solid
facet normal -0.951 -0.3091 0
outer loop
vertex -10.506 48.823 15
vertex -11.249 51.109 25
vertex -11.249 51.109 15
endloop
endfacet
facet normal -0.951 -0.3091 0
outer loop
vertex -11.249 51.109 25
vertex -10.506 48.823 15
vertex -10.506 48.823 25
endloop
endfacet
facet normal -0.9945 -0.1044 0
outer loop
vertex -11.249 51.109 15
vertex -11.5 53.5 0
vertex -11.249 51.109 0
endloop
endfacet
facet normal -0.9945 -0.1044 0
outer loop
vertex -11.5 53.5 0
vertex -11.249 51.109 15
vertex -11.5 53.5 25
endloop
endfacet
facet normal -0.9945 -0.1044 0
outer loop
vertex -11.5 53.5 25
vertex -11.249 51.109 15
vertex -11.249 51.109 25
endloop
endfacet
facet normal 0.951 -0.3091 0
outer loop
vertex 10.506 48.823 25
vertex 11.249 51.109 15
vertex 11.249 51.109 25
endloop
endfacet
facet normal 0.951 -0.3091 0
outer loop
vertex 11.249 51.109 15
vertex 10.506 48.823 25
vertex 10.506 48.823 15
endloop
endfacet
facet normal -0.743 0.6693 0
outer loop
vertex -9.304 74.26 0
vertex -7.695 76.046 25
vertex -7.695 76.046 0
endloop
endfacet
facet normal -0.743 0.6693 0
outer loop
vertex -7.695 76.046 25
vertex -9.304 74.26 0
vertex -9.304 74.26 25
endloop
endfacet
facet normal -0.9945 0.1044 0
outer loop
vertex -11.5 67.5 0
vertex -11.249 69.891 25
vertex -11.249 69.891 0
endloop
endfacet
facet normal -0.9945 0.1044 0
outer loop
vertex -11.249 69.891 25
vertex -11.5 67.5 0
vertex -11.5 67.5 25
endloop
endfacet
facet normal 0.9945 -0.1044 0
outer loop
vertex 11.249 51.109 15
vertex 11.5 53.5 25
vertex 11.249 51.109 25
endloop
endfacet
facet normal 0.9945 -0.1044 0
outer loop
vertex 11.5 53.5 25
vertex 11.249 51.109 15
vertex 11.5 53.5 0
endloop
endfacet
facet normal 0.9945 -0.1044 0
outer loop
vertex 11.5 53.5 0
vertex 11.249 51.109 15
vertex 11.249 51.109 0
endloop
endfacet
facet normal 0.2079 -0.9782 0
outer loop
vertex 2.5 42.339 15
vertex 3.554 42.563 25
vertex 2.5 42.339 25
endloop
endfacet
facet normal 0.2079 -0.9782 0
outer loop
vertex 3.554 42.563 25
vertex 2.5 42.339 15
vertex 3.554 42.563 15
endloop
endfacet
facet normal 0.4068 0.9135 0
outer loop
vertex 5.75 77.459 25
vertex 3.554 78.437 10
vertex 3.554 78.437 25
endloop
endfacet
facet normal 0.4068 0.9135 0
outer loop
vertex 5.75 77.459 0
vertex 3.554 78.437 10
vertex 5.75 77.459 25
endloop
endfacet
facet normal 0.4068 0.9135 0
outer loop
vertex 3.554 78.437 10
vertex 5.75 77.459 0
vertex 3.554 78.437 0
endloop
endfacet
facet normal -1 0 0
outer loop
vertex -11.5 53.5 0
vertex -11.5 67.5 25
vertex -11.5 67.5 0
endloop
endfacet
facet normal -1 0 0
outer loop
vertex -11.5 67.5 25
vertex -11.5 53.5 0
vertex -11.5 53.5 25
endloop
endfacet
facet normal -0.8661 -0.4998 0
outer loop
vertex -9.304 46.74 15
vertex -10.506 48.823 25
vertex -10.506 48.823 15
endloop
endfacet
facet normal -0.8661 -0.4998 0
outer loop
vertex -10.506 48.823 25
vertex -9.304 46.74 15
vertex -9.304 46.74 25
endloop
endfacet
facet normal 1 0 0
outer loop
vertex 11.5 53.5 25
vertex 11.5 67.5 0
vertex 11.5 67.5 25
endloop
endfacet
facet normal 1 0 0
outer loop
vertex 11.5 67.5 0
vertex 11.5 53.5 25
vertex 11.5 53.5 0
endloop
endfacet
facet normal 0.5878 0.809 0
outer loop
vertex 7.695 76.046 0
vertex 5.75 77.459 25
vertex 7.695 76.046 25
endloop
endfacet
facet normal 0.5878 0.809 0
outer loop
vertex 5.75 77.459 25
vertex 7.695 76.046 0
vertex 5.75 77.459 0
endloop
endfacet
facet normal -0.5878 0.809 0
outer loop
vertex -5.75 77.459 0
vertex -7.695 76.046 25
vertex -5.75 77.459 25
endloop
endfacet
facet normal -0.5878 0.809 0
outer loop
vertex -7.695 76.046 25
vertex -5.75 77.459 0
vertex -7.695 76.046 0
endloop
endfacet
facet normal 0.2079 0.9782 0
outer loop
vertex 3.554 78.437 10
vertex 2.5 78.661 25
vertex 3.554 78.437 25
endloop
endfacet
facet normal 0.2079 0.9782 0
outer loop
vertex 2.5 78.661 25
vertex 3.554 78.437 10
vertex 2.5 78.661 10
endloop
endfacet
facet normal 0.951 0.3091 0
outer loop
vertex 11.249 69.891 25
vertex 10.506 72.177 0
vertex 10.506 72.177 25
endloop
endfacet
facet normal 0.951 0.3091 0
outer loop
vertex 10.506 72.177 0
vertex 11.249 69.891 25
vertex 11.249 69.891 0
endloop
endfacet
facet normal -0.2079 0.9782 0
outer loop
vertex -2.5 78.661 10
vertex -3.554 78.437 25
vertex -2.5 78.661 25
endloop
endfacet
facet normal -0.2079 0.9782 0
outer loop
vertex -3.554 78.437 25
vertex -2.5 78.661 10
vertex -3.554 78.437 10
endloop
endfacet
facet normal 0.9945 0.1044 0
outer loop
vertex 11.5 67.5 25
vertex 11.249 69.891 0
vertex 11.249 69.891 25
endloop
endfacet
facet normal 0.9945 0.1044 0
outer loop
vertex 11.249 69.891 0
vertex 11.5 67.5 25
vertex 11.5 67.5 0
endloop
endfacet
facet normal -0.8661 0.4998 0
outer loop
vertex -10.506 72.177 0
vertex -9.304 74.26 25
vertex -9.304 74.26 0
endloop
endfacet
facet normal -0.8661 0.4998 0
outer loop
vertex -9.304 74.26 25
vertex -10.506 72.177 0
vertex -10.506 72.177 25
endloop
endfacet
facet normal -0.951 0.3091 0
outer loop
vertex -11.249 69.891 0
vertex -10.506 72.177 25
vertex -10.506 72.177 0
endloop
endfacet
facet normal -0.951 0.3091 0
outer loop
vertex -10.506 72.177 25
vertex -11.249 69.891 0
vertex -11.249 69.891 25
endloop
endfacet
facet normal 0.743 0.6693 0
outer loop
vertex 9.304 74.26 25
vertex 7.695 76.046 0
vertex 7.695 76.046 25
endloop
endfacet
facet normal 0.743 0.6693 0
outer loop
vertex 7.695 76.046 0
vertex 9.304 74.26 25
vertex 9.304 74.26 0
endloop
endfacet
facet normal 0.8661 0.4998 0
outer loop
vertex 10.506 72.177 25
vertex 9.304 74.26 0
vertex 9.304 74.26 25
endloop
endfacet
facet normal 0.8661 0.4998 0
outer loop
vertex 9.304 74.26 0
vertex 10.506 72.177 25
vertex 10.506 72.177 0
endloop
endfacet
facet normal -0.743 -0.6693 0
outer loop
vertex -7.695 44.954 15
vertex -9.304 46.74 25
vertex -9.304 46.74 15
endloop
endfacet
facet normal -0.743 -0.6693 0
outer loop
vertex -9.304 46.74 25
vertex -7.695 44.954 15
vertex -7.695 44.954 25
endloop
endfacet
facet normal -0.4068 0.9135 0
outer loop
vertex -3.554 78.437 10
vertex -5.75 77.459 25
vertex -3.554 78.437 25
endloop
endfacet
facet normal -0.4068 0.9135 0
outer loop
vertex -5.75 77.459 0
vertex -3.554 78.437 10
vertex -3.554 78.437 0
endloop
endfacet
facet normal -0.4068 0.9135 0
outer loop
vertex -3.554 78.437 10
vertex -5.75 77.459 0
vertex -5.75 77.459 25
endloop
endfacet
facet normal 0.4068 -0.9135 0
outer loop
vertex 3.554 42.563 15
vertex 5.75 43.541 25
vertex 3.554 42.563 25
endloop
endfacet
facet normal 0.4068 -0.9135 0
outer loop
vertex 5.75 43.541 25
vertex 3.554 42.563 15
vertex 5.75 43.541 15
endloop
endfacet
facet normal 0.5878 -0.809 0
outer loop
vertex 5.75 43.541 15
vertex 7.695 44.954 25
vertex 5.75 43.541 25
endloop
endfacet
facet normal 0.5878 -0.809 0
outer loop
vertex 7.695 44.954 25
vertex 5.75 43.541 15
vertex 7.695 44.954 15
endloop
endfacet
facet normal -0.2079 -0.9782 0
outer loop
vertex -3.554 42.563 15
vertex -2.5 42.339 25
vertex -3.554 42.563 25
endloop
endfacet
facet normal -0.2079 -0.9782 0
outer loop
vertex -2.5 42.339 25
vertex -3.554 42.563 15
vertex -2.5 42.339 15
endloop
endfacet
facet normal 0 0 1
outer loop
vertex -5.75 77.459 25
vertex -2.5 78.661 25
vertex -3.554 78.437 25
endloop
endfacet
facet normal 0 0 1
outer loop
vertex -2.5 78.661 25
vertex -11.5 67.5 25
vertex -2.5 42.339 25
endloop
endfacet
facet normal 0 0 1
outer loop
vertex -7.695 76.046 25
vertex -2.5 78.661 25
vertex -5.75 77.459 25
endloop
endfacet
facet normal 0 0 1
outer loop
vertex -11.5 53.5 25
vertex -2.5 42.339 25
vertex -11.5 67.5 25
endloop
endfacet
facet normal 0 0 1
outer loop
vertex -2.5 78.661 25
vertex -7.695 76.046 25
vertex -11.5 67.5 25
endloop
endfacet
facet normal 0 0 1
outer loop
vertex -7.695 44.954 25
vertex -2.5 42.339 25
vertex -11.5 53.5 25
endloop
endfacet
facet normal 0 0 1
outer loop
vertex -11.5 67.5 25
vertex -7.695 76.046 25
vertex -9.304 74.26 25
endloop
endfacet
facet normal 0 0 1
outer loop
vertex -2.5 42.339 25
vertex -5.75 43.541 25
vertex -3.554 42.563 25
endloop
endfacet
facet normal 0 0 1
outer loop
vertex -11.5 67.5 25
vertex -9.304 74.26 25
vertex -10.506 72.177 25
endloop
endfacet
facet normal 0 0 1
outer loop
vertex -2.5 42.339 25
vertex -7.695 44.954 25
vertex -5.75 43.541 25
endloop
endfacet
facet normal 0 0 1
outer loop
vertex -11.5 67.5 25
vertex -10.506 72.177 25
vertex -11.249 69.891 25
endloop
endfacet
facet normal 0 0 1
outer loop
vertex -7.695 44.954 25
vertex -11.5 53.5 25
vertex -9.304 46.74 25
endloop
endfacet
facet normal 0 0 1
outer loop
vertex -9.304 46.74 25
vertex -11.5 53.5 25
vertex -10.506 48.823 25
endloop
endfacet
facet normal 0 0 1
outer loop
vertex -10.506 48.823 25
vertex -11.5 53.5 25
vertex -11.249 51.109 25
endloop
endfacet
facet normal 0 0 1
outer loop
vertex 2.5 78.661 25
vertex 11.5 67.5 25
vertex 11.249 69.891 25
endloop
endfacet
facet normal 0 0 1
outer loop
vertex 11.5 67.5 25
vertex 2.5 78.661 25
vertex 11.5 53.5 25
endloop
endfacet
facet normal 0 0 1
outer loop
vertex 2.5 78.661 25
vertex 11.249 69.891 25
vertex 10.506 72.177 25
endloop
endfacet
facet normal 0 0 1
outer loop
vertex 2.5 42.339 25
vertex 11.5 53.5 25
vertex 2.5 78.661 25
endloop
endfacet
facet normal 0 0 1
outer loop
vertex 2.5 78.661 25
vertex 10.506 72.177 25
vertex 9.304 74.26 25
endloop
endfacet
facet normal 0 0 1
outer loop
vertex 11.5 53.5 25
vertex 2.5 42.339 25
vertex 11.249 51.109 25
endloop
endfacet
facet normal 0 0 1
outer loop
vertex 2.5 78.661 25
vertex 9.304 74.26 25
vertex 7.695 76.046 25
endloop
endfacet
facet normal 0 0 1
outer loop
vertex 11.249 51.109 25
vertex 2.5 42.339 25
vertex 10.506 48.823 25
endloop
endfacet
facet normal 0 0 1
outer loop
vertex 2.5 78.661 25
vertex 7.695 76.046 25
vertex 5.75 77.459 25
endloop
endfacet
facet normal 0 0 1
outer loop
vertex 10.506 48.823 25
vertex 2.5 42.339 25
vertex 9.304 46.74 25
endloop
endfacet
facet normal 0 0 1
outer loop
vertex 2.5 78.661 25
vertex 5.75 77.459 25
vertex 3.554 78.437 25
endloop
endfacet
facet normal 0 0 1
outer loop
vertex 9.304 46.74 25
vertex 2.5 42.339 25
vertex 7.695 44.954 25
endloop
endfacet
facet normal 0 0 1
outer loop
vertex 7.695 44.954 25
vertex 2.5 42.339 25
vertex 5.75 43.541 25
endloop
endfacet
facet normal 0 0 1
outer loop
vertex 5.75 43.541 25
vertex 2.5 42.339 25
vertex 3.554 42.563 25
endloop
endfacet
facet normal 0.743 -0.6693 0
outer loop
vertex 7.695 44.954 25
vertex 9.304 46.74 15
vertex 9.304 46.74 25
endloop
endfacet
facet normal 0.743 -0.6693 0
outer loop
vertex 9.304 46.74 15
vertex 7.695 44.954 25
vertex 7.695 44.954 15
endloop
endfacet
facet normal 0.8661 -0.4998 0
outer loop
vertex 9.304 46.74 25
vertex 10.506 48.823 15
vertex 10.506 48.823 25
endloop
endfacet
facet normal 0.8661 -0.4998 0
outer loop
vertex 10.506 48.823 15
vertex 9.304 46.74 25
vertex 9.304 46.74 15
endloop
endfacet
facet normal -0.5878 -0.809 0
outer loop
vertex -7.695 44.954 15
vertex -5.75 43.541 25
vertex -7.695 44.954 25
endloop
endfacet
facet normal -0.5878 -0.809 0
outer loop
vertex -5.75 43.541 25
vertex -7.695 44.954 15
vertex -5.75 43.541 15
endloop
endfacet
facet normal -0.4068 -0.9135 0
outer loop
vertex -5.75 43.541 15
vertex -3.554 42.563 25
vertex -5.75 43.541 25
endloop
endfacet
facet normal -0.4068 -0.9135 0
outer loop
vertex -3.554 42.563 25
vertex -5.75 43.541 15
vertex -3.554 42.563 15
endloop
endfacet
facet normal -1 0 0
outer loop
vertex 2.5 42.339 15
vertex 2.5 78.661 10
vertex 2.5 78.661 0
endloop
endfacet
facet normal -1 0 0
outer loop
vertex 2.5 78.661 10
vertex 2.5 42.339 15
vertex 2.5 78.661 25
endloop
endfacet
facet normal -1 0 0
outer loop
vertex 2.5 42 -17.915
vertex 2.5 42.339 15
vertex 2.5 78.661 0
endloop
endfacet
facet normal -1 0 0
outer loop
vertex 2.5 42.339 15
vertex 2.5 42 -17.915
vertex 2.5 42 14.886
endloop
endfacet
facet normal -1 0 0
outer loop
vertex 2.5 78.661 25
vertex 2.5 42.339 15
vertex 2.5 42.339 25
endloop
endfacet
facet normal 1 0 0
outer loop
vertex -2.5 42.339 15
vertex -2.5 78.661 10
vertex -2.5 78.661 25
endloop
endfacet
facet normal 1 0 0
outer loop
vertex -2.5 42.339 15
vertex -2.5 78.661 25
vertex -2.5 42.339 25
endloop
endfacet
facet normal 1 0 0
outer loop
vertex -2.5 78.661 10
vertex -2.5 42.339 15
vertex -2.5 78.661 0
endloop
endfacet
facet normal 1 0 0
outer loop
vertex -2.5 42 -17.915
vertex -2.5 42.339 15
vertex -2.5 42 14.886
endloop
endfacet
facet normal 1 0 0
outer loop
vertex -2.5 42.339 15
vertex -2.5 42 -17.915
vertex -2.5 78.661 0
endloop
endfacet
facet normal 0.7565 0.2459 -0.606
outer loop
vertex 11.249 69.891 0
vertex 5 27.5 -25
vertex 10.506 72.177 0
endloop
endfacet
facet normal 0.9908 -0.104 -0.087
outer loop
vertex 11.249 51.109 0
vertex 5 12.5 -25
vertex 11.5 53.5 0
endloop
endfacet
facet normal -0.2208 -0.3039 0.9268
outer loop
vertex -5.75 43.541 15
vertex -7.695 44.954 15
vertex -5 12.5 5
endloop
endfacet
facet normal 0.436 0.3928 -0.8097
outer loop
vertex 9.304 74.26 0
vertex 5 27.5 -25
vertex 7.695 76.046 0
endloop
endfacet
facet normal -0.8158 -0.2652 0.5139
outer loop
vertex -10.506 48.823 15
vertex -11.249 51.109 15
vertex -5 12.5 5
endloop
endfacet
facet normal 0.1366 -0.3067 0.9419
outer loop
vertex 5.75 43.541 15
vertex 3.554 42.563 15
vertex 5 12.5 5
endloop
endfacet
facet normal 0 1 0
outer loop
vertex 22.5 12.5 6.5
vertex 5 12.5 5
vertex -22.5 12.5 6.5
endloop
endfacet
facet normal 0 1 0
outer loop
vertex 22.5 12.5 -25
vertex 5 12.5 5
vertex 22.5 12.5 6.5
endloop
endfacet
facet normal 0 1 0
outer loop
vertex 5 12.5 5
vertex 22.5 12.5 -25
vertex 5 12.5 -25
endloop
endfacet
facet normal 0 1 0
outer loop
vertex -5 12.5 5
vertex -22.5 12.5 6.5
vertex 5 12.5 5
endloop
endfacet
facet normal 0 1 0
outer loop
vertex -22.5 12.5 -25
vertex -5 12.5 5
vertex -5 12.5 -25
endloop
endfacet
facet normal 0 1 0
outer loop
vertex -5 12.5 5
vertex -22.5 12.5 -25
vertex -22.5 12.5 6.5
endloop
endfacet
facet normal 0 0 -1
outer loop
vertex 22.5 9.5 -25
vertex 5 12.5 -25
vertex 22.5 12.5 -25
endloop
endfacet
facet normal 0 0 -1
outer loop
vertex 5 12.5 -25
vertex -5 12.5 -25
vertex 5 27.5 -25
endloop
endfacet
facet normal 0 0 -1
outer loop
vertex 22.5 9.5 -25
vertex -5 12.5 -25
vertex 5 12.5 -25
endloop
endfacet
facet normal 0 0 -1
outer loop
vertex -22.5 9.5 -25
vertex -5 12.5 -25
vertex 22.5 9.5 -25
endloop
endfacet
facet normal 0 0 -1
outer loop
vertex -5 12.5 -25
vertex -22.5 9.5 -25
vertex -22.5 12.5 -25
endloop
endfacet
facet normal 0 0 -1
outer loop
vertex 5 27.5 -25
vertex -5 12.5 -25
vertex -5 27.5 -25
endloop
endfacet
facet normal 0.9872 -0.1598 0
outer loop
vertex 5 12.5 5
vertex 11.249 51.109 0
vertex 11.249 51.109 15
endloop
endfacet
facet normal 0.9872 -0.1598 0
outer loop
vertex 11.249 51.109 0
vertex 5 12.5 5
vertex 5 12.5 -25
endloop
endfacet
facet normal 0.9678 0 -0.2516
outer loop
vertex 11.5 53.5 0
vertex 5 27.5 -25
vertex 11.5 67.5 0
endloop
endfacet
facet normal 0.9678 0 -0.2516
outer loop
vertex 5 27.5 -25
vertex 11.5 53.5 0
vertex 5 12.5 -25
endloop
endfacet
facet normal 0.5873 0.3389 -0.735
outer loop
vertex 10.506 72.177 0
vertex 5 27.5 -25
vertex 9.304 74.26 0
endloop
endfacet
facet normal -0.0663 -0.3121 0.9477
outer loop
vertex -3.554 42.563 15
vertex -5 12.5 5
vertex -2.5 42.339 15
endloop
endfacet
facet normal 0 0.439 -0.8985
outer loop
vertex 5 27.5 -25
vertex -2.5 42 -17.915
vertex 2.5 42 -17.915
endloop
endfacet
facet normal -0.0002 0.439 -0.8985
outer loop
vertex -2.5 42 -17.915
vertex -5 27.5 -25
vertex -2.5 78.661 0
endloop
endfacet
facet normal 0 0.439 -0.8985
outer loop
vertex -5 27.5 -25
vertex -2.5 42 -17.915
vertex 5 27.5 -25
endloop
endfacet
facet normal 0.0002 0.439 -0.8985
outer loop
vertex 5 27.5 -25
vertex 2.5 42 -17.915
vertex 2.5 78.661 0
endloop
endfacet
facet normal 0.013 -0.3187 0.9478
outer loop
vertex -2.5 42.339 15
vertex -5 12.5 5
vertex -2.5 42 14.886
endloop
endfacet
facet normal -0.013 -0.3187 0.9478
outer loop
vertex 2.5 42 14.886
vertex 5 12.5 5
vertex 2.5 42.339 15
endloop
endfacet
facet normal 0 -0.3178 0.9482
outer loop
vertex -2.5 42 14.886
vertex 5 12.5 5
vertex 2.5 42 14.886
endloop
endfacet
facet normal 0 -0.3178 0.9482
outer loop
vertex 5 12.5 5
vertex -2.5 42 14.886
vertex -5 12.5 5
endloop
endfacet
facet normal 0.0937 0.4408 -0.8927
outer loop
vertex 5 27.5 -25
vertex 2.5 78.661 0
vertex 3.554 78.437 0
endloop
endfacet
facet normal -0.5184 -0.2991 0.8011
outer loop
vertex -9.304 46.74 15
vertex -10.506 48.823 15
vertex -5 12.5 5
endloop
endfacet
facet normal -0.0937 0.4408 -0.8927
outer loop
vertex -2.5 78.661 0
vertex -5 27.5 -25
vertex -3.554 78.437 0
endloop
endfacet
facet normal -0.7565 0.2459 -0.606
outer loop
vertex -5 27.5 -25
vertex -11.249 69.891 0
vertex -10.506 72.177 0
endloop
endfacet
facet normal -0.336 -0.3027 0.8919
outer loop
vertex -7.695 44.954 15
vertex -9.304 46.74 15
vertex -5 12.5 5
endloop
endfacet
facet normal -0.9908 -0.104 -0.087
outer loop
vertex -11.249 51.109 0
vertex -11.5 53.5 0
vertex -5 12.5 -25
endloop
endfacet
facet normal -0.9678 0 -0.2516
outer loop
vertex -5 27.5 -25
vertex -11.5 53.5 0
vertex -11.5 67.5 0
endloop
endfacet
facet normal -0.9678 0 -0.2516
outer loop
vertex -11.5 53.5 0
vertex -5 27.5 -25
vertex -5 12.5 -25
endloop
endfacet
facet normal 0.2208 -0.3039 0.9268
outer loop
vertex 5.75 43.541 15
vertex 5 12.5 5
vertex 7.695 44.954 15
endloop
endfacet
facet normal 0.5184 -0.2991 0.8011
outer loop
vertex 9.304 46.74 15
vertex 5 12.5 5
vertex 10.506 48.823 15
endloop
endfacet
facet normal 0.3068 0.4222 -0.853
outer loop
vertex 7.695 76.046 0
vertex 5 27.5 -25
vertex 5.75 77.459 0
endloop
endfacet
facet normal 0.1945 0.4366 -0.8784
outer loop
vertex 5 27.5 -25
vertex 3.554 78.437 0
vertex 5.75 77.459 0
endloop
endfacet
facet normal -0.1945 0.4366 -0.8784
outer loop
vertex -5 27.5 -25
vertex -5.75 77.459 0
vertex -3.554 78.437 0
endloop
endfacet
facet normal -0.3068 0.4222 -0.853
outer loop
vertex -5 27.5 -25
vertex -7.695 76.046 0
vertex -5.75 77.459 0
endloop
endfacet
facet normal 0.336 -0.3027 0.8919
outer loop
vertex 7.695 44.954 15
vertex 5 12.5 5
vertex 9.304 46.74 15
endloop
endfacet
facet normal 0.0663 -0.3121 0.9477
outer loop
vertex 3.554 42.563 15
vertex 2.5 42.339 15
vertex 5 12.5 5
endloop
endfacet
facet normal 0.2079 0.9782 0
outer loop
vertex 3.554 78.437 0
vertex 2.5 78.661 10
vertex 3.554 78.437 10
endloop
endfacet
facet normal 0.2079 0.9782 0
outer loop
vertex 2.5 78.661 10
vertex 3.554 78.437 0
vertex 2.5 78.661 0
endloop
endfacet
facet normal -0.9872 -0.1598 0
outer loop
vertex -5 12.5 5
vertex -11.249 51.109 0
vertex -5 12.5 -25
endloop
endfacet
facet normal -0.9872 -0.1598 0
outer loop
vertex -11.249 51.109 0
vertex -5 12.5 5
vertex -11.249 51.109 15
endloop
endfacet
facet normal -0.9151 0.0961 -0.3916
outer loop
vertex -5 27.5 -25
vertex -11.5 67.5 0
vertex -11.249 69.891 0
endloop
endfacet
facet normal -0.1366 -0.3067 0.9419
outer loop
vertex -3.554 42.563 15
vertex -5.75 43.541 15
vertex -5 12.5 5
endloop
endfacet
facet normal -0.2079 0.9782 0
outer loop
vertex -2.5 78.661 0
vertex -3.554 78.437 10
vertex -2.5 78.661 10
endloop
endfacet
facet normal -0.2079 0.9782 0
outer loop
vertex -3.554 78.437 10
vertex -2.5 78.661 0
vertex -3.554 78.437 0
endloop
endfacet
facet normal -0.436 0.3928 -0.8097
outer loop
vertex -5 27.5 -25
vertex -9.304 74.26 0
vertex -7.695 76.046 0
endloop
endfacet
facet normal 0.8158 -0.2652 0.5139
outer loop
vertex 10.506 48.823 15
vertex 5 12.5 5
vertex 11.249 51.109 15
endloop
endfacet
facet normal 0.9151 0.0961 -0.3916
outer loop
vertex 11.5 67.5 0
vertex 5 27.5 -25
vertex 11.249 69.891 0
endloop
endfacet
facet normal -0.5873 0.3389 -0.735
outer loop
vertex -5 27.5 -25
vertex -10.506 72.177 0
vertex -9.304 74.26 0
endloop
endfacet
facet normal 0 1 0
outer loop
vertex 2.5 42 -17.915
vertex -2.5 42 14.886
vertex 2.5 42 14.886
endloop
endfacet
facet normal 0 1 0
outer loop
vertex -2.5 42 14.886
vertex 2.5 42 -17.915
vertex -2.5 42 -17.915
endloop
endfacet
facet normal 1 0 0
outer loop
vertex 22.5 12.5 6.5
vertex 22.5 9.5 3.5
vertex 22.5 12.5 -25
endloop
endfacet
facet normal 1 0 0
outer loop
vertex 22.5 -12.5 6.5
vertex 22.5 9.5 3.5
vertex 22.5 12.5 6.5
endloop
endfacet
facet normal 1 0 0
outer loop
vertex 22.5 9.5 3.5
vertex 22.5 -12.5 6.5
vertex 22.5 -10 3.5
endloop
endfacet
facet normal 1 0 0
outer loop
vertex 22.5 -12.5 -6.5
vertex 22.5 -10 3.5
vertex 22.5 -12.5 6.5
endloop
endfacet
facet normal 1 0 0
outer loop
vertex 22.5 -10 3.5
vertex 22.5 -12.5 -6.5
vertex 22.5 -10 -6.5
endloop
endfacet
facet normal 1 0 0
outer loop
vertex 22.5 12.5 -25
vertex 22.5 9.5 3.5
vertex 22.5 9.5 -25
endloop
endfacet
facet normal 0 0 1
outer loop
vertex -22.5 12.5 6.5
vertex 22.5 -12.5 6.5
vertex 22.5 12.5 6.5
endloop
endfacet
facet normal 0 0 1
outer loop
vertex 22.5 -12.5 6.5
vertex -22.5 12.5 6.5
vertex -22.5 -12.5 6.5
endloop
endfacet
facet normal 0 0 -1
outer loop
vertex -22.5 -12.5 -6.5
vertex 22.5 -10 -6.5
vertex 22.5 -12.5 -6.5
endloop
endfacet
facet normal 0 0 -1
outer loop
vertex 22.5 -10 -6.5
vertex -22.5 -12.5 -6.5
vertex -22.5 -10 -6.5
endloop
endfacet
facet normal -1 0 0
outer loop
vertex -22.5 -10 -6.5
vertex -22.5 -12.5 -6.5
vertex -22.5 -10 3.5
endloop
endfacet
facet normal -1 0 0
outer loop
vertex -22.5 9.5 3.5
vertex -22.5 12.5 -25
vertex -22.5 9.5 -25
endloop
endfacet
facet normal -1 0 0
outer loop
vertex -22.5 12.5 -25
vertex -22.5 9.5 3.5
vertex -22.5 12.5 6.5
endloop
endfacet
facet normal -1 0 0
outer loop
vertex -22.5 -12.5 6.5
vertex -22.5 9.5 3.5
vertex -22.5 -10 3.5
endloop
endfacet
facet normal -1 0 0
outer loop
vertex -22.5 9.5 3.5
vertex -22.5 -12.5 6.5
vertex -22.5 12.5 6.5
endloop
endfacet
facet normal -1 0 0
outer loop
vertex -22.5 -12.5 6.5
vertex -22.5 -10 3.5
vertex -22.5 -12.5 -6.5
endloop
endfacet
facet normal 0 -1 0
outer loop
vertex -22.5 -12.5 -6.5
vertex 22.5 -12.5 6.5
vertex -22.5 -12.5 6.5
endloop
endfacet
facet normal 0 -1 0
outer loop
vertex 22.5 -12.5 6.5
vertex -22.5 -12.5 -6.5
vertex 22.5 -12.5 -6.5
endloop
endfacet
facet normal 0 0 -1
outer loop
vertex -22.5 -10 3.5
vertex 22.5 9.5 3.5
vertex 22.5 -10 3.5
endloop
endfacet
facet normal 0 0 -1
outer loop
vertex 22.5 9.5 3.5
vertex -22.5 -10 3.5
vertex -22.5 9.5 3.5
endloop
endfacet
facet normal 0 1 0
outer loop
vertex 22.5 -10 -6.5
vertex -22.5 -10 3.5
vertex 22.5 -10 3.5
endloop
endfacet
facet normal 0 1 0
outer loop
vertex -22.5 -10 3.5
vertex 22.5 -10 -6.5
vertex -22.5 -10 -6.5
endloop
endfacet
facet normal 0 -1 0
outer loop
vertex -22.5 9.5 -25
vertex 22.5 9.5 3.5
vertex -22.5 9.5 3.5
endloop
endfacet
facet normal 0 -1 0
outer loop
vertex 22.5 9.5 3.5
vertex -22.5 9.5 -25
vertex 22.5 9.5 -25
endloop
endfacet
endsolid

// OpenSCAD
use <MCAD/regular_shapes.scad>

echo(version = version());

fn = 300; // sets the smoothness of the cylinder

// monitor_hook dimensions
monitor_hook_width = 45;
monitor_hook_front = 13;
section_height = 30;
section_z_trans = - 10;

// meaurements for the isight oval base:
isight_length = 37;
isight_width = 23;
isight_pizero_slot = 5;

module monitor_hook() {
    difference()
        {
            cube([monitor_hook_width, 25, monitor_hook_front], center = true);
            translate([0, 0, - 3]) cube([monitor_hook_width + 1, 20, monitor_hook_front], center = true);
        }
    translate([0, 11, section_z_trans]) cube([45, 3, section_height], center = true);
}


module my_tube() {
    color("green")
        translate([0, 20, - 10])
            rotate(a = [0, 90, 90])
                cube([30, 10, 15], center = true);
}


module rear_tube() {
    hull() {
        my_tube();
        translate([0, isight_length + 5, 0]) isight_base();
    }
    translate([0, isight_length + 5, 10]) isight_base();
}

module isight_base(extrude = 15) {
    difference() {
        linear_extrude(extrude)
            hull() {
                translate([0, isight_width / 2, 0]) circle(r = isight_width / 2);
                translate([0, isight_length - isight_width / 2, 0]) circle(r = isight_width / 2);
            };
        translate([- isight_pizero_slot / 2, 0, - 1]) cube([isight_pizero_slot, isight_length, extrude + 2]);
    }
}

// now build everything
color("blue")
    difference()
        {
            rear_tube();
            translate([- isight_pizero_slot / 2, 42, - 50]) cube([isight_pizero_slot, isight_length, 80]);
        };


monitor_hook();
